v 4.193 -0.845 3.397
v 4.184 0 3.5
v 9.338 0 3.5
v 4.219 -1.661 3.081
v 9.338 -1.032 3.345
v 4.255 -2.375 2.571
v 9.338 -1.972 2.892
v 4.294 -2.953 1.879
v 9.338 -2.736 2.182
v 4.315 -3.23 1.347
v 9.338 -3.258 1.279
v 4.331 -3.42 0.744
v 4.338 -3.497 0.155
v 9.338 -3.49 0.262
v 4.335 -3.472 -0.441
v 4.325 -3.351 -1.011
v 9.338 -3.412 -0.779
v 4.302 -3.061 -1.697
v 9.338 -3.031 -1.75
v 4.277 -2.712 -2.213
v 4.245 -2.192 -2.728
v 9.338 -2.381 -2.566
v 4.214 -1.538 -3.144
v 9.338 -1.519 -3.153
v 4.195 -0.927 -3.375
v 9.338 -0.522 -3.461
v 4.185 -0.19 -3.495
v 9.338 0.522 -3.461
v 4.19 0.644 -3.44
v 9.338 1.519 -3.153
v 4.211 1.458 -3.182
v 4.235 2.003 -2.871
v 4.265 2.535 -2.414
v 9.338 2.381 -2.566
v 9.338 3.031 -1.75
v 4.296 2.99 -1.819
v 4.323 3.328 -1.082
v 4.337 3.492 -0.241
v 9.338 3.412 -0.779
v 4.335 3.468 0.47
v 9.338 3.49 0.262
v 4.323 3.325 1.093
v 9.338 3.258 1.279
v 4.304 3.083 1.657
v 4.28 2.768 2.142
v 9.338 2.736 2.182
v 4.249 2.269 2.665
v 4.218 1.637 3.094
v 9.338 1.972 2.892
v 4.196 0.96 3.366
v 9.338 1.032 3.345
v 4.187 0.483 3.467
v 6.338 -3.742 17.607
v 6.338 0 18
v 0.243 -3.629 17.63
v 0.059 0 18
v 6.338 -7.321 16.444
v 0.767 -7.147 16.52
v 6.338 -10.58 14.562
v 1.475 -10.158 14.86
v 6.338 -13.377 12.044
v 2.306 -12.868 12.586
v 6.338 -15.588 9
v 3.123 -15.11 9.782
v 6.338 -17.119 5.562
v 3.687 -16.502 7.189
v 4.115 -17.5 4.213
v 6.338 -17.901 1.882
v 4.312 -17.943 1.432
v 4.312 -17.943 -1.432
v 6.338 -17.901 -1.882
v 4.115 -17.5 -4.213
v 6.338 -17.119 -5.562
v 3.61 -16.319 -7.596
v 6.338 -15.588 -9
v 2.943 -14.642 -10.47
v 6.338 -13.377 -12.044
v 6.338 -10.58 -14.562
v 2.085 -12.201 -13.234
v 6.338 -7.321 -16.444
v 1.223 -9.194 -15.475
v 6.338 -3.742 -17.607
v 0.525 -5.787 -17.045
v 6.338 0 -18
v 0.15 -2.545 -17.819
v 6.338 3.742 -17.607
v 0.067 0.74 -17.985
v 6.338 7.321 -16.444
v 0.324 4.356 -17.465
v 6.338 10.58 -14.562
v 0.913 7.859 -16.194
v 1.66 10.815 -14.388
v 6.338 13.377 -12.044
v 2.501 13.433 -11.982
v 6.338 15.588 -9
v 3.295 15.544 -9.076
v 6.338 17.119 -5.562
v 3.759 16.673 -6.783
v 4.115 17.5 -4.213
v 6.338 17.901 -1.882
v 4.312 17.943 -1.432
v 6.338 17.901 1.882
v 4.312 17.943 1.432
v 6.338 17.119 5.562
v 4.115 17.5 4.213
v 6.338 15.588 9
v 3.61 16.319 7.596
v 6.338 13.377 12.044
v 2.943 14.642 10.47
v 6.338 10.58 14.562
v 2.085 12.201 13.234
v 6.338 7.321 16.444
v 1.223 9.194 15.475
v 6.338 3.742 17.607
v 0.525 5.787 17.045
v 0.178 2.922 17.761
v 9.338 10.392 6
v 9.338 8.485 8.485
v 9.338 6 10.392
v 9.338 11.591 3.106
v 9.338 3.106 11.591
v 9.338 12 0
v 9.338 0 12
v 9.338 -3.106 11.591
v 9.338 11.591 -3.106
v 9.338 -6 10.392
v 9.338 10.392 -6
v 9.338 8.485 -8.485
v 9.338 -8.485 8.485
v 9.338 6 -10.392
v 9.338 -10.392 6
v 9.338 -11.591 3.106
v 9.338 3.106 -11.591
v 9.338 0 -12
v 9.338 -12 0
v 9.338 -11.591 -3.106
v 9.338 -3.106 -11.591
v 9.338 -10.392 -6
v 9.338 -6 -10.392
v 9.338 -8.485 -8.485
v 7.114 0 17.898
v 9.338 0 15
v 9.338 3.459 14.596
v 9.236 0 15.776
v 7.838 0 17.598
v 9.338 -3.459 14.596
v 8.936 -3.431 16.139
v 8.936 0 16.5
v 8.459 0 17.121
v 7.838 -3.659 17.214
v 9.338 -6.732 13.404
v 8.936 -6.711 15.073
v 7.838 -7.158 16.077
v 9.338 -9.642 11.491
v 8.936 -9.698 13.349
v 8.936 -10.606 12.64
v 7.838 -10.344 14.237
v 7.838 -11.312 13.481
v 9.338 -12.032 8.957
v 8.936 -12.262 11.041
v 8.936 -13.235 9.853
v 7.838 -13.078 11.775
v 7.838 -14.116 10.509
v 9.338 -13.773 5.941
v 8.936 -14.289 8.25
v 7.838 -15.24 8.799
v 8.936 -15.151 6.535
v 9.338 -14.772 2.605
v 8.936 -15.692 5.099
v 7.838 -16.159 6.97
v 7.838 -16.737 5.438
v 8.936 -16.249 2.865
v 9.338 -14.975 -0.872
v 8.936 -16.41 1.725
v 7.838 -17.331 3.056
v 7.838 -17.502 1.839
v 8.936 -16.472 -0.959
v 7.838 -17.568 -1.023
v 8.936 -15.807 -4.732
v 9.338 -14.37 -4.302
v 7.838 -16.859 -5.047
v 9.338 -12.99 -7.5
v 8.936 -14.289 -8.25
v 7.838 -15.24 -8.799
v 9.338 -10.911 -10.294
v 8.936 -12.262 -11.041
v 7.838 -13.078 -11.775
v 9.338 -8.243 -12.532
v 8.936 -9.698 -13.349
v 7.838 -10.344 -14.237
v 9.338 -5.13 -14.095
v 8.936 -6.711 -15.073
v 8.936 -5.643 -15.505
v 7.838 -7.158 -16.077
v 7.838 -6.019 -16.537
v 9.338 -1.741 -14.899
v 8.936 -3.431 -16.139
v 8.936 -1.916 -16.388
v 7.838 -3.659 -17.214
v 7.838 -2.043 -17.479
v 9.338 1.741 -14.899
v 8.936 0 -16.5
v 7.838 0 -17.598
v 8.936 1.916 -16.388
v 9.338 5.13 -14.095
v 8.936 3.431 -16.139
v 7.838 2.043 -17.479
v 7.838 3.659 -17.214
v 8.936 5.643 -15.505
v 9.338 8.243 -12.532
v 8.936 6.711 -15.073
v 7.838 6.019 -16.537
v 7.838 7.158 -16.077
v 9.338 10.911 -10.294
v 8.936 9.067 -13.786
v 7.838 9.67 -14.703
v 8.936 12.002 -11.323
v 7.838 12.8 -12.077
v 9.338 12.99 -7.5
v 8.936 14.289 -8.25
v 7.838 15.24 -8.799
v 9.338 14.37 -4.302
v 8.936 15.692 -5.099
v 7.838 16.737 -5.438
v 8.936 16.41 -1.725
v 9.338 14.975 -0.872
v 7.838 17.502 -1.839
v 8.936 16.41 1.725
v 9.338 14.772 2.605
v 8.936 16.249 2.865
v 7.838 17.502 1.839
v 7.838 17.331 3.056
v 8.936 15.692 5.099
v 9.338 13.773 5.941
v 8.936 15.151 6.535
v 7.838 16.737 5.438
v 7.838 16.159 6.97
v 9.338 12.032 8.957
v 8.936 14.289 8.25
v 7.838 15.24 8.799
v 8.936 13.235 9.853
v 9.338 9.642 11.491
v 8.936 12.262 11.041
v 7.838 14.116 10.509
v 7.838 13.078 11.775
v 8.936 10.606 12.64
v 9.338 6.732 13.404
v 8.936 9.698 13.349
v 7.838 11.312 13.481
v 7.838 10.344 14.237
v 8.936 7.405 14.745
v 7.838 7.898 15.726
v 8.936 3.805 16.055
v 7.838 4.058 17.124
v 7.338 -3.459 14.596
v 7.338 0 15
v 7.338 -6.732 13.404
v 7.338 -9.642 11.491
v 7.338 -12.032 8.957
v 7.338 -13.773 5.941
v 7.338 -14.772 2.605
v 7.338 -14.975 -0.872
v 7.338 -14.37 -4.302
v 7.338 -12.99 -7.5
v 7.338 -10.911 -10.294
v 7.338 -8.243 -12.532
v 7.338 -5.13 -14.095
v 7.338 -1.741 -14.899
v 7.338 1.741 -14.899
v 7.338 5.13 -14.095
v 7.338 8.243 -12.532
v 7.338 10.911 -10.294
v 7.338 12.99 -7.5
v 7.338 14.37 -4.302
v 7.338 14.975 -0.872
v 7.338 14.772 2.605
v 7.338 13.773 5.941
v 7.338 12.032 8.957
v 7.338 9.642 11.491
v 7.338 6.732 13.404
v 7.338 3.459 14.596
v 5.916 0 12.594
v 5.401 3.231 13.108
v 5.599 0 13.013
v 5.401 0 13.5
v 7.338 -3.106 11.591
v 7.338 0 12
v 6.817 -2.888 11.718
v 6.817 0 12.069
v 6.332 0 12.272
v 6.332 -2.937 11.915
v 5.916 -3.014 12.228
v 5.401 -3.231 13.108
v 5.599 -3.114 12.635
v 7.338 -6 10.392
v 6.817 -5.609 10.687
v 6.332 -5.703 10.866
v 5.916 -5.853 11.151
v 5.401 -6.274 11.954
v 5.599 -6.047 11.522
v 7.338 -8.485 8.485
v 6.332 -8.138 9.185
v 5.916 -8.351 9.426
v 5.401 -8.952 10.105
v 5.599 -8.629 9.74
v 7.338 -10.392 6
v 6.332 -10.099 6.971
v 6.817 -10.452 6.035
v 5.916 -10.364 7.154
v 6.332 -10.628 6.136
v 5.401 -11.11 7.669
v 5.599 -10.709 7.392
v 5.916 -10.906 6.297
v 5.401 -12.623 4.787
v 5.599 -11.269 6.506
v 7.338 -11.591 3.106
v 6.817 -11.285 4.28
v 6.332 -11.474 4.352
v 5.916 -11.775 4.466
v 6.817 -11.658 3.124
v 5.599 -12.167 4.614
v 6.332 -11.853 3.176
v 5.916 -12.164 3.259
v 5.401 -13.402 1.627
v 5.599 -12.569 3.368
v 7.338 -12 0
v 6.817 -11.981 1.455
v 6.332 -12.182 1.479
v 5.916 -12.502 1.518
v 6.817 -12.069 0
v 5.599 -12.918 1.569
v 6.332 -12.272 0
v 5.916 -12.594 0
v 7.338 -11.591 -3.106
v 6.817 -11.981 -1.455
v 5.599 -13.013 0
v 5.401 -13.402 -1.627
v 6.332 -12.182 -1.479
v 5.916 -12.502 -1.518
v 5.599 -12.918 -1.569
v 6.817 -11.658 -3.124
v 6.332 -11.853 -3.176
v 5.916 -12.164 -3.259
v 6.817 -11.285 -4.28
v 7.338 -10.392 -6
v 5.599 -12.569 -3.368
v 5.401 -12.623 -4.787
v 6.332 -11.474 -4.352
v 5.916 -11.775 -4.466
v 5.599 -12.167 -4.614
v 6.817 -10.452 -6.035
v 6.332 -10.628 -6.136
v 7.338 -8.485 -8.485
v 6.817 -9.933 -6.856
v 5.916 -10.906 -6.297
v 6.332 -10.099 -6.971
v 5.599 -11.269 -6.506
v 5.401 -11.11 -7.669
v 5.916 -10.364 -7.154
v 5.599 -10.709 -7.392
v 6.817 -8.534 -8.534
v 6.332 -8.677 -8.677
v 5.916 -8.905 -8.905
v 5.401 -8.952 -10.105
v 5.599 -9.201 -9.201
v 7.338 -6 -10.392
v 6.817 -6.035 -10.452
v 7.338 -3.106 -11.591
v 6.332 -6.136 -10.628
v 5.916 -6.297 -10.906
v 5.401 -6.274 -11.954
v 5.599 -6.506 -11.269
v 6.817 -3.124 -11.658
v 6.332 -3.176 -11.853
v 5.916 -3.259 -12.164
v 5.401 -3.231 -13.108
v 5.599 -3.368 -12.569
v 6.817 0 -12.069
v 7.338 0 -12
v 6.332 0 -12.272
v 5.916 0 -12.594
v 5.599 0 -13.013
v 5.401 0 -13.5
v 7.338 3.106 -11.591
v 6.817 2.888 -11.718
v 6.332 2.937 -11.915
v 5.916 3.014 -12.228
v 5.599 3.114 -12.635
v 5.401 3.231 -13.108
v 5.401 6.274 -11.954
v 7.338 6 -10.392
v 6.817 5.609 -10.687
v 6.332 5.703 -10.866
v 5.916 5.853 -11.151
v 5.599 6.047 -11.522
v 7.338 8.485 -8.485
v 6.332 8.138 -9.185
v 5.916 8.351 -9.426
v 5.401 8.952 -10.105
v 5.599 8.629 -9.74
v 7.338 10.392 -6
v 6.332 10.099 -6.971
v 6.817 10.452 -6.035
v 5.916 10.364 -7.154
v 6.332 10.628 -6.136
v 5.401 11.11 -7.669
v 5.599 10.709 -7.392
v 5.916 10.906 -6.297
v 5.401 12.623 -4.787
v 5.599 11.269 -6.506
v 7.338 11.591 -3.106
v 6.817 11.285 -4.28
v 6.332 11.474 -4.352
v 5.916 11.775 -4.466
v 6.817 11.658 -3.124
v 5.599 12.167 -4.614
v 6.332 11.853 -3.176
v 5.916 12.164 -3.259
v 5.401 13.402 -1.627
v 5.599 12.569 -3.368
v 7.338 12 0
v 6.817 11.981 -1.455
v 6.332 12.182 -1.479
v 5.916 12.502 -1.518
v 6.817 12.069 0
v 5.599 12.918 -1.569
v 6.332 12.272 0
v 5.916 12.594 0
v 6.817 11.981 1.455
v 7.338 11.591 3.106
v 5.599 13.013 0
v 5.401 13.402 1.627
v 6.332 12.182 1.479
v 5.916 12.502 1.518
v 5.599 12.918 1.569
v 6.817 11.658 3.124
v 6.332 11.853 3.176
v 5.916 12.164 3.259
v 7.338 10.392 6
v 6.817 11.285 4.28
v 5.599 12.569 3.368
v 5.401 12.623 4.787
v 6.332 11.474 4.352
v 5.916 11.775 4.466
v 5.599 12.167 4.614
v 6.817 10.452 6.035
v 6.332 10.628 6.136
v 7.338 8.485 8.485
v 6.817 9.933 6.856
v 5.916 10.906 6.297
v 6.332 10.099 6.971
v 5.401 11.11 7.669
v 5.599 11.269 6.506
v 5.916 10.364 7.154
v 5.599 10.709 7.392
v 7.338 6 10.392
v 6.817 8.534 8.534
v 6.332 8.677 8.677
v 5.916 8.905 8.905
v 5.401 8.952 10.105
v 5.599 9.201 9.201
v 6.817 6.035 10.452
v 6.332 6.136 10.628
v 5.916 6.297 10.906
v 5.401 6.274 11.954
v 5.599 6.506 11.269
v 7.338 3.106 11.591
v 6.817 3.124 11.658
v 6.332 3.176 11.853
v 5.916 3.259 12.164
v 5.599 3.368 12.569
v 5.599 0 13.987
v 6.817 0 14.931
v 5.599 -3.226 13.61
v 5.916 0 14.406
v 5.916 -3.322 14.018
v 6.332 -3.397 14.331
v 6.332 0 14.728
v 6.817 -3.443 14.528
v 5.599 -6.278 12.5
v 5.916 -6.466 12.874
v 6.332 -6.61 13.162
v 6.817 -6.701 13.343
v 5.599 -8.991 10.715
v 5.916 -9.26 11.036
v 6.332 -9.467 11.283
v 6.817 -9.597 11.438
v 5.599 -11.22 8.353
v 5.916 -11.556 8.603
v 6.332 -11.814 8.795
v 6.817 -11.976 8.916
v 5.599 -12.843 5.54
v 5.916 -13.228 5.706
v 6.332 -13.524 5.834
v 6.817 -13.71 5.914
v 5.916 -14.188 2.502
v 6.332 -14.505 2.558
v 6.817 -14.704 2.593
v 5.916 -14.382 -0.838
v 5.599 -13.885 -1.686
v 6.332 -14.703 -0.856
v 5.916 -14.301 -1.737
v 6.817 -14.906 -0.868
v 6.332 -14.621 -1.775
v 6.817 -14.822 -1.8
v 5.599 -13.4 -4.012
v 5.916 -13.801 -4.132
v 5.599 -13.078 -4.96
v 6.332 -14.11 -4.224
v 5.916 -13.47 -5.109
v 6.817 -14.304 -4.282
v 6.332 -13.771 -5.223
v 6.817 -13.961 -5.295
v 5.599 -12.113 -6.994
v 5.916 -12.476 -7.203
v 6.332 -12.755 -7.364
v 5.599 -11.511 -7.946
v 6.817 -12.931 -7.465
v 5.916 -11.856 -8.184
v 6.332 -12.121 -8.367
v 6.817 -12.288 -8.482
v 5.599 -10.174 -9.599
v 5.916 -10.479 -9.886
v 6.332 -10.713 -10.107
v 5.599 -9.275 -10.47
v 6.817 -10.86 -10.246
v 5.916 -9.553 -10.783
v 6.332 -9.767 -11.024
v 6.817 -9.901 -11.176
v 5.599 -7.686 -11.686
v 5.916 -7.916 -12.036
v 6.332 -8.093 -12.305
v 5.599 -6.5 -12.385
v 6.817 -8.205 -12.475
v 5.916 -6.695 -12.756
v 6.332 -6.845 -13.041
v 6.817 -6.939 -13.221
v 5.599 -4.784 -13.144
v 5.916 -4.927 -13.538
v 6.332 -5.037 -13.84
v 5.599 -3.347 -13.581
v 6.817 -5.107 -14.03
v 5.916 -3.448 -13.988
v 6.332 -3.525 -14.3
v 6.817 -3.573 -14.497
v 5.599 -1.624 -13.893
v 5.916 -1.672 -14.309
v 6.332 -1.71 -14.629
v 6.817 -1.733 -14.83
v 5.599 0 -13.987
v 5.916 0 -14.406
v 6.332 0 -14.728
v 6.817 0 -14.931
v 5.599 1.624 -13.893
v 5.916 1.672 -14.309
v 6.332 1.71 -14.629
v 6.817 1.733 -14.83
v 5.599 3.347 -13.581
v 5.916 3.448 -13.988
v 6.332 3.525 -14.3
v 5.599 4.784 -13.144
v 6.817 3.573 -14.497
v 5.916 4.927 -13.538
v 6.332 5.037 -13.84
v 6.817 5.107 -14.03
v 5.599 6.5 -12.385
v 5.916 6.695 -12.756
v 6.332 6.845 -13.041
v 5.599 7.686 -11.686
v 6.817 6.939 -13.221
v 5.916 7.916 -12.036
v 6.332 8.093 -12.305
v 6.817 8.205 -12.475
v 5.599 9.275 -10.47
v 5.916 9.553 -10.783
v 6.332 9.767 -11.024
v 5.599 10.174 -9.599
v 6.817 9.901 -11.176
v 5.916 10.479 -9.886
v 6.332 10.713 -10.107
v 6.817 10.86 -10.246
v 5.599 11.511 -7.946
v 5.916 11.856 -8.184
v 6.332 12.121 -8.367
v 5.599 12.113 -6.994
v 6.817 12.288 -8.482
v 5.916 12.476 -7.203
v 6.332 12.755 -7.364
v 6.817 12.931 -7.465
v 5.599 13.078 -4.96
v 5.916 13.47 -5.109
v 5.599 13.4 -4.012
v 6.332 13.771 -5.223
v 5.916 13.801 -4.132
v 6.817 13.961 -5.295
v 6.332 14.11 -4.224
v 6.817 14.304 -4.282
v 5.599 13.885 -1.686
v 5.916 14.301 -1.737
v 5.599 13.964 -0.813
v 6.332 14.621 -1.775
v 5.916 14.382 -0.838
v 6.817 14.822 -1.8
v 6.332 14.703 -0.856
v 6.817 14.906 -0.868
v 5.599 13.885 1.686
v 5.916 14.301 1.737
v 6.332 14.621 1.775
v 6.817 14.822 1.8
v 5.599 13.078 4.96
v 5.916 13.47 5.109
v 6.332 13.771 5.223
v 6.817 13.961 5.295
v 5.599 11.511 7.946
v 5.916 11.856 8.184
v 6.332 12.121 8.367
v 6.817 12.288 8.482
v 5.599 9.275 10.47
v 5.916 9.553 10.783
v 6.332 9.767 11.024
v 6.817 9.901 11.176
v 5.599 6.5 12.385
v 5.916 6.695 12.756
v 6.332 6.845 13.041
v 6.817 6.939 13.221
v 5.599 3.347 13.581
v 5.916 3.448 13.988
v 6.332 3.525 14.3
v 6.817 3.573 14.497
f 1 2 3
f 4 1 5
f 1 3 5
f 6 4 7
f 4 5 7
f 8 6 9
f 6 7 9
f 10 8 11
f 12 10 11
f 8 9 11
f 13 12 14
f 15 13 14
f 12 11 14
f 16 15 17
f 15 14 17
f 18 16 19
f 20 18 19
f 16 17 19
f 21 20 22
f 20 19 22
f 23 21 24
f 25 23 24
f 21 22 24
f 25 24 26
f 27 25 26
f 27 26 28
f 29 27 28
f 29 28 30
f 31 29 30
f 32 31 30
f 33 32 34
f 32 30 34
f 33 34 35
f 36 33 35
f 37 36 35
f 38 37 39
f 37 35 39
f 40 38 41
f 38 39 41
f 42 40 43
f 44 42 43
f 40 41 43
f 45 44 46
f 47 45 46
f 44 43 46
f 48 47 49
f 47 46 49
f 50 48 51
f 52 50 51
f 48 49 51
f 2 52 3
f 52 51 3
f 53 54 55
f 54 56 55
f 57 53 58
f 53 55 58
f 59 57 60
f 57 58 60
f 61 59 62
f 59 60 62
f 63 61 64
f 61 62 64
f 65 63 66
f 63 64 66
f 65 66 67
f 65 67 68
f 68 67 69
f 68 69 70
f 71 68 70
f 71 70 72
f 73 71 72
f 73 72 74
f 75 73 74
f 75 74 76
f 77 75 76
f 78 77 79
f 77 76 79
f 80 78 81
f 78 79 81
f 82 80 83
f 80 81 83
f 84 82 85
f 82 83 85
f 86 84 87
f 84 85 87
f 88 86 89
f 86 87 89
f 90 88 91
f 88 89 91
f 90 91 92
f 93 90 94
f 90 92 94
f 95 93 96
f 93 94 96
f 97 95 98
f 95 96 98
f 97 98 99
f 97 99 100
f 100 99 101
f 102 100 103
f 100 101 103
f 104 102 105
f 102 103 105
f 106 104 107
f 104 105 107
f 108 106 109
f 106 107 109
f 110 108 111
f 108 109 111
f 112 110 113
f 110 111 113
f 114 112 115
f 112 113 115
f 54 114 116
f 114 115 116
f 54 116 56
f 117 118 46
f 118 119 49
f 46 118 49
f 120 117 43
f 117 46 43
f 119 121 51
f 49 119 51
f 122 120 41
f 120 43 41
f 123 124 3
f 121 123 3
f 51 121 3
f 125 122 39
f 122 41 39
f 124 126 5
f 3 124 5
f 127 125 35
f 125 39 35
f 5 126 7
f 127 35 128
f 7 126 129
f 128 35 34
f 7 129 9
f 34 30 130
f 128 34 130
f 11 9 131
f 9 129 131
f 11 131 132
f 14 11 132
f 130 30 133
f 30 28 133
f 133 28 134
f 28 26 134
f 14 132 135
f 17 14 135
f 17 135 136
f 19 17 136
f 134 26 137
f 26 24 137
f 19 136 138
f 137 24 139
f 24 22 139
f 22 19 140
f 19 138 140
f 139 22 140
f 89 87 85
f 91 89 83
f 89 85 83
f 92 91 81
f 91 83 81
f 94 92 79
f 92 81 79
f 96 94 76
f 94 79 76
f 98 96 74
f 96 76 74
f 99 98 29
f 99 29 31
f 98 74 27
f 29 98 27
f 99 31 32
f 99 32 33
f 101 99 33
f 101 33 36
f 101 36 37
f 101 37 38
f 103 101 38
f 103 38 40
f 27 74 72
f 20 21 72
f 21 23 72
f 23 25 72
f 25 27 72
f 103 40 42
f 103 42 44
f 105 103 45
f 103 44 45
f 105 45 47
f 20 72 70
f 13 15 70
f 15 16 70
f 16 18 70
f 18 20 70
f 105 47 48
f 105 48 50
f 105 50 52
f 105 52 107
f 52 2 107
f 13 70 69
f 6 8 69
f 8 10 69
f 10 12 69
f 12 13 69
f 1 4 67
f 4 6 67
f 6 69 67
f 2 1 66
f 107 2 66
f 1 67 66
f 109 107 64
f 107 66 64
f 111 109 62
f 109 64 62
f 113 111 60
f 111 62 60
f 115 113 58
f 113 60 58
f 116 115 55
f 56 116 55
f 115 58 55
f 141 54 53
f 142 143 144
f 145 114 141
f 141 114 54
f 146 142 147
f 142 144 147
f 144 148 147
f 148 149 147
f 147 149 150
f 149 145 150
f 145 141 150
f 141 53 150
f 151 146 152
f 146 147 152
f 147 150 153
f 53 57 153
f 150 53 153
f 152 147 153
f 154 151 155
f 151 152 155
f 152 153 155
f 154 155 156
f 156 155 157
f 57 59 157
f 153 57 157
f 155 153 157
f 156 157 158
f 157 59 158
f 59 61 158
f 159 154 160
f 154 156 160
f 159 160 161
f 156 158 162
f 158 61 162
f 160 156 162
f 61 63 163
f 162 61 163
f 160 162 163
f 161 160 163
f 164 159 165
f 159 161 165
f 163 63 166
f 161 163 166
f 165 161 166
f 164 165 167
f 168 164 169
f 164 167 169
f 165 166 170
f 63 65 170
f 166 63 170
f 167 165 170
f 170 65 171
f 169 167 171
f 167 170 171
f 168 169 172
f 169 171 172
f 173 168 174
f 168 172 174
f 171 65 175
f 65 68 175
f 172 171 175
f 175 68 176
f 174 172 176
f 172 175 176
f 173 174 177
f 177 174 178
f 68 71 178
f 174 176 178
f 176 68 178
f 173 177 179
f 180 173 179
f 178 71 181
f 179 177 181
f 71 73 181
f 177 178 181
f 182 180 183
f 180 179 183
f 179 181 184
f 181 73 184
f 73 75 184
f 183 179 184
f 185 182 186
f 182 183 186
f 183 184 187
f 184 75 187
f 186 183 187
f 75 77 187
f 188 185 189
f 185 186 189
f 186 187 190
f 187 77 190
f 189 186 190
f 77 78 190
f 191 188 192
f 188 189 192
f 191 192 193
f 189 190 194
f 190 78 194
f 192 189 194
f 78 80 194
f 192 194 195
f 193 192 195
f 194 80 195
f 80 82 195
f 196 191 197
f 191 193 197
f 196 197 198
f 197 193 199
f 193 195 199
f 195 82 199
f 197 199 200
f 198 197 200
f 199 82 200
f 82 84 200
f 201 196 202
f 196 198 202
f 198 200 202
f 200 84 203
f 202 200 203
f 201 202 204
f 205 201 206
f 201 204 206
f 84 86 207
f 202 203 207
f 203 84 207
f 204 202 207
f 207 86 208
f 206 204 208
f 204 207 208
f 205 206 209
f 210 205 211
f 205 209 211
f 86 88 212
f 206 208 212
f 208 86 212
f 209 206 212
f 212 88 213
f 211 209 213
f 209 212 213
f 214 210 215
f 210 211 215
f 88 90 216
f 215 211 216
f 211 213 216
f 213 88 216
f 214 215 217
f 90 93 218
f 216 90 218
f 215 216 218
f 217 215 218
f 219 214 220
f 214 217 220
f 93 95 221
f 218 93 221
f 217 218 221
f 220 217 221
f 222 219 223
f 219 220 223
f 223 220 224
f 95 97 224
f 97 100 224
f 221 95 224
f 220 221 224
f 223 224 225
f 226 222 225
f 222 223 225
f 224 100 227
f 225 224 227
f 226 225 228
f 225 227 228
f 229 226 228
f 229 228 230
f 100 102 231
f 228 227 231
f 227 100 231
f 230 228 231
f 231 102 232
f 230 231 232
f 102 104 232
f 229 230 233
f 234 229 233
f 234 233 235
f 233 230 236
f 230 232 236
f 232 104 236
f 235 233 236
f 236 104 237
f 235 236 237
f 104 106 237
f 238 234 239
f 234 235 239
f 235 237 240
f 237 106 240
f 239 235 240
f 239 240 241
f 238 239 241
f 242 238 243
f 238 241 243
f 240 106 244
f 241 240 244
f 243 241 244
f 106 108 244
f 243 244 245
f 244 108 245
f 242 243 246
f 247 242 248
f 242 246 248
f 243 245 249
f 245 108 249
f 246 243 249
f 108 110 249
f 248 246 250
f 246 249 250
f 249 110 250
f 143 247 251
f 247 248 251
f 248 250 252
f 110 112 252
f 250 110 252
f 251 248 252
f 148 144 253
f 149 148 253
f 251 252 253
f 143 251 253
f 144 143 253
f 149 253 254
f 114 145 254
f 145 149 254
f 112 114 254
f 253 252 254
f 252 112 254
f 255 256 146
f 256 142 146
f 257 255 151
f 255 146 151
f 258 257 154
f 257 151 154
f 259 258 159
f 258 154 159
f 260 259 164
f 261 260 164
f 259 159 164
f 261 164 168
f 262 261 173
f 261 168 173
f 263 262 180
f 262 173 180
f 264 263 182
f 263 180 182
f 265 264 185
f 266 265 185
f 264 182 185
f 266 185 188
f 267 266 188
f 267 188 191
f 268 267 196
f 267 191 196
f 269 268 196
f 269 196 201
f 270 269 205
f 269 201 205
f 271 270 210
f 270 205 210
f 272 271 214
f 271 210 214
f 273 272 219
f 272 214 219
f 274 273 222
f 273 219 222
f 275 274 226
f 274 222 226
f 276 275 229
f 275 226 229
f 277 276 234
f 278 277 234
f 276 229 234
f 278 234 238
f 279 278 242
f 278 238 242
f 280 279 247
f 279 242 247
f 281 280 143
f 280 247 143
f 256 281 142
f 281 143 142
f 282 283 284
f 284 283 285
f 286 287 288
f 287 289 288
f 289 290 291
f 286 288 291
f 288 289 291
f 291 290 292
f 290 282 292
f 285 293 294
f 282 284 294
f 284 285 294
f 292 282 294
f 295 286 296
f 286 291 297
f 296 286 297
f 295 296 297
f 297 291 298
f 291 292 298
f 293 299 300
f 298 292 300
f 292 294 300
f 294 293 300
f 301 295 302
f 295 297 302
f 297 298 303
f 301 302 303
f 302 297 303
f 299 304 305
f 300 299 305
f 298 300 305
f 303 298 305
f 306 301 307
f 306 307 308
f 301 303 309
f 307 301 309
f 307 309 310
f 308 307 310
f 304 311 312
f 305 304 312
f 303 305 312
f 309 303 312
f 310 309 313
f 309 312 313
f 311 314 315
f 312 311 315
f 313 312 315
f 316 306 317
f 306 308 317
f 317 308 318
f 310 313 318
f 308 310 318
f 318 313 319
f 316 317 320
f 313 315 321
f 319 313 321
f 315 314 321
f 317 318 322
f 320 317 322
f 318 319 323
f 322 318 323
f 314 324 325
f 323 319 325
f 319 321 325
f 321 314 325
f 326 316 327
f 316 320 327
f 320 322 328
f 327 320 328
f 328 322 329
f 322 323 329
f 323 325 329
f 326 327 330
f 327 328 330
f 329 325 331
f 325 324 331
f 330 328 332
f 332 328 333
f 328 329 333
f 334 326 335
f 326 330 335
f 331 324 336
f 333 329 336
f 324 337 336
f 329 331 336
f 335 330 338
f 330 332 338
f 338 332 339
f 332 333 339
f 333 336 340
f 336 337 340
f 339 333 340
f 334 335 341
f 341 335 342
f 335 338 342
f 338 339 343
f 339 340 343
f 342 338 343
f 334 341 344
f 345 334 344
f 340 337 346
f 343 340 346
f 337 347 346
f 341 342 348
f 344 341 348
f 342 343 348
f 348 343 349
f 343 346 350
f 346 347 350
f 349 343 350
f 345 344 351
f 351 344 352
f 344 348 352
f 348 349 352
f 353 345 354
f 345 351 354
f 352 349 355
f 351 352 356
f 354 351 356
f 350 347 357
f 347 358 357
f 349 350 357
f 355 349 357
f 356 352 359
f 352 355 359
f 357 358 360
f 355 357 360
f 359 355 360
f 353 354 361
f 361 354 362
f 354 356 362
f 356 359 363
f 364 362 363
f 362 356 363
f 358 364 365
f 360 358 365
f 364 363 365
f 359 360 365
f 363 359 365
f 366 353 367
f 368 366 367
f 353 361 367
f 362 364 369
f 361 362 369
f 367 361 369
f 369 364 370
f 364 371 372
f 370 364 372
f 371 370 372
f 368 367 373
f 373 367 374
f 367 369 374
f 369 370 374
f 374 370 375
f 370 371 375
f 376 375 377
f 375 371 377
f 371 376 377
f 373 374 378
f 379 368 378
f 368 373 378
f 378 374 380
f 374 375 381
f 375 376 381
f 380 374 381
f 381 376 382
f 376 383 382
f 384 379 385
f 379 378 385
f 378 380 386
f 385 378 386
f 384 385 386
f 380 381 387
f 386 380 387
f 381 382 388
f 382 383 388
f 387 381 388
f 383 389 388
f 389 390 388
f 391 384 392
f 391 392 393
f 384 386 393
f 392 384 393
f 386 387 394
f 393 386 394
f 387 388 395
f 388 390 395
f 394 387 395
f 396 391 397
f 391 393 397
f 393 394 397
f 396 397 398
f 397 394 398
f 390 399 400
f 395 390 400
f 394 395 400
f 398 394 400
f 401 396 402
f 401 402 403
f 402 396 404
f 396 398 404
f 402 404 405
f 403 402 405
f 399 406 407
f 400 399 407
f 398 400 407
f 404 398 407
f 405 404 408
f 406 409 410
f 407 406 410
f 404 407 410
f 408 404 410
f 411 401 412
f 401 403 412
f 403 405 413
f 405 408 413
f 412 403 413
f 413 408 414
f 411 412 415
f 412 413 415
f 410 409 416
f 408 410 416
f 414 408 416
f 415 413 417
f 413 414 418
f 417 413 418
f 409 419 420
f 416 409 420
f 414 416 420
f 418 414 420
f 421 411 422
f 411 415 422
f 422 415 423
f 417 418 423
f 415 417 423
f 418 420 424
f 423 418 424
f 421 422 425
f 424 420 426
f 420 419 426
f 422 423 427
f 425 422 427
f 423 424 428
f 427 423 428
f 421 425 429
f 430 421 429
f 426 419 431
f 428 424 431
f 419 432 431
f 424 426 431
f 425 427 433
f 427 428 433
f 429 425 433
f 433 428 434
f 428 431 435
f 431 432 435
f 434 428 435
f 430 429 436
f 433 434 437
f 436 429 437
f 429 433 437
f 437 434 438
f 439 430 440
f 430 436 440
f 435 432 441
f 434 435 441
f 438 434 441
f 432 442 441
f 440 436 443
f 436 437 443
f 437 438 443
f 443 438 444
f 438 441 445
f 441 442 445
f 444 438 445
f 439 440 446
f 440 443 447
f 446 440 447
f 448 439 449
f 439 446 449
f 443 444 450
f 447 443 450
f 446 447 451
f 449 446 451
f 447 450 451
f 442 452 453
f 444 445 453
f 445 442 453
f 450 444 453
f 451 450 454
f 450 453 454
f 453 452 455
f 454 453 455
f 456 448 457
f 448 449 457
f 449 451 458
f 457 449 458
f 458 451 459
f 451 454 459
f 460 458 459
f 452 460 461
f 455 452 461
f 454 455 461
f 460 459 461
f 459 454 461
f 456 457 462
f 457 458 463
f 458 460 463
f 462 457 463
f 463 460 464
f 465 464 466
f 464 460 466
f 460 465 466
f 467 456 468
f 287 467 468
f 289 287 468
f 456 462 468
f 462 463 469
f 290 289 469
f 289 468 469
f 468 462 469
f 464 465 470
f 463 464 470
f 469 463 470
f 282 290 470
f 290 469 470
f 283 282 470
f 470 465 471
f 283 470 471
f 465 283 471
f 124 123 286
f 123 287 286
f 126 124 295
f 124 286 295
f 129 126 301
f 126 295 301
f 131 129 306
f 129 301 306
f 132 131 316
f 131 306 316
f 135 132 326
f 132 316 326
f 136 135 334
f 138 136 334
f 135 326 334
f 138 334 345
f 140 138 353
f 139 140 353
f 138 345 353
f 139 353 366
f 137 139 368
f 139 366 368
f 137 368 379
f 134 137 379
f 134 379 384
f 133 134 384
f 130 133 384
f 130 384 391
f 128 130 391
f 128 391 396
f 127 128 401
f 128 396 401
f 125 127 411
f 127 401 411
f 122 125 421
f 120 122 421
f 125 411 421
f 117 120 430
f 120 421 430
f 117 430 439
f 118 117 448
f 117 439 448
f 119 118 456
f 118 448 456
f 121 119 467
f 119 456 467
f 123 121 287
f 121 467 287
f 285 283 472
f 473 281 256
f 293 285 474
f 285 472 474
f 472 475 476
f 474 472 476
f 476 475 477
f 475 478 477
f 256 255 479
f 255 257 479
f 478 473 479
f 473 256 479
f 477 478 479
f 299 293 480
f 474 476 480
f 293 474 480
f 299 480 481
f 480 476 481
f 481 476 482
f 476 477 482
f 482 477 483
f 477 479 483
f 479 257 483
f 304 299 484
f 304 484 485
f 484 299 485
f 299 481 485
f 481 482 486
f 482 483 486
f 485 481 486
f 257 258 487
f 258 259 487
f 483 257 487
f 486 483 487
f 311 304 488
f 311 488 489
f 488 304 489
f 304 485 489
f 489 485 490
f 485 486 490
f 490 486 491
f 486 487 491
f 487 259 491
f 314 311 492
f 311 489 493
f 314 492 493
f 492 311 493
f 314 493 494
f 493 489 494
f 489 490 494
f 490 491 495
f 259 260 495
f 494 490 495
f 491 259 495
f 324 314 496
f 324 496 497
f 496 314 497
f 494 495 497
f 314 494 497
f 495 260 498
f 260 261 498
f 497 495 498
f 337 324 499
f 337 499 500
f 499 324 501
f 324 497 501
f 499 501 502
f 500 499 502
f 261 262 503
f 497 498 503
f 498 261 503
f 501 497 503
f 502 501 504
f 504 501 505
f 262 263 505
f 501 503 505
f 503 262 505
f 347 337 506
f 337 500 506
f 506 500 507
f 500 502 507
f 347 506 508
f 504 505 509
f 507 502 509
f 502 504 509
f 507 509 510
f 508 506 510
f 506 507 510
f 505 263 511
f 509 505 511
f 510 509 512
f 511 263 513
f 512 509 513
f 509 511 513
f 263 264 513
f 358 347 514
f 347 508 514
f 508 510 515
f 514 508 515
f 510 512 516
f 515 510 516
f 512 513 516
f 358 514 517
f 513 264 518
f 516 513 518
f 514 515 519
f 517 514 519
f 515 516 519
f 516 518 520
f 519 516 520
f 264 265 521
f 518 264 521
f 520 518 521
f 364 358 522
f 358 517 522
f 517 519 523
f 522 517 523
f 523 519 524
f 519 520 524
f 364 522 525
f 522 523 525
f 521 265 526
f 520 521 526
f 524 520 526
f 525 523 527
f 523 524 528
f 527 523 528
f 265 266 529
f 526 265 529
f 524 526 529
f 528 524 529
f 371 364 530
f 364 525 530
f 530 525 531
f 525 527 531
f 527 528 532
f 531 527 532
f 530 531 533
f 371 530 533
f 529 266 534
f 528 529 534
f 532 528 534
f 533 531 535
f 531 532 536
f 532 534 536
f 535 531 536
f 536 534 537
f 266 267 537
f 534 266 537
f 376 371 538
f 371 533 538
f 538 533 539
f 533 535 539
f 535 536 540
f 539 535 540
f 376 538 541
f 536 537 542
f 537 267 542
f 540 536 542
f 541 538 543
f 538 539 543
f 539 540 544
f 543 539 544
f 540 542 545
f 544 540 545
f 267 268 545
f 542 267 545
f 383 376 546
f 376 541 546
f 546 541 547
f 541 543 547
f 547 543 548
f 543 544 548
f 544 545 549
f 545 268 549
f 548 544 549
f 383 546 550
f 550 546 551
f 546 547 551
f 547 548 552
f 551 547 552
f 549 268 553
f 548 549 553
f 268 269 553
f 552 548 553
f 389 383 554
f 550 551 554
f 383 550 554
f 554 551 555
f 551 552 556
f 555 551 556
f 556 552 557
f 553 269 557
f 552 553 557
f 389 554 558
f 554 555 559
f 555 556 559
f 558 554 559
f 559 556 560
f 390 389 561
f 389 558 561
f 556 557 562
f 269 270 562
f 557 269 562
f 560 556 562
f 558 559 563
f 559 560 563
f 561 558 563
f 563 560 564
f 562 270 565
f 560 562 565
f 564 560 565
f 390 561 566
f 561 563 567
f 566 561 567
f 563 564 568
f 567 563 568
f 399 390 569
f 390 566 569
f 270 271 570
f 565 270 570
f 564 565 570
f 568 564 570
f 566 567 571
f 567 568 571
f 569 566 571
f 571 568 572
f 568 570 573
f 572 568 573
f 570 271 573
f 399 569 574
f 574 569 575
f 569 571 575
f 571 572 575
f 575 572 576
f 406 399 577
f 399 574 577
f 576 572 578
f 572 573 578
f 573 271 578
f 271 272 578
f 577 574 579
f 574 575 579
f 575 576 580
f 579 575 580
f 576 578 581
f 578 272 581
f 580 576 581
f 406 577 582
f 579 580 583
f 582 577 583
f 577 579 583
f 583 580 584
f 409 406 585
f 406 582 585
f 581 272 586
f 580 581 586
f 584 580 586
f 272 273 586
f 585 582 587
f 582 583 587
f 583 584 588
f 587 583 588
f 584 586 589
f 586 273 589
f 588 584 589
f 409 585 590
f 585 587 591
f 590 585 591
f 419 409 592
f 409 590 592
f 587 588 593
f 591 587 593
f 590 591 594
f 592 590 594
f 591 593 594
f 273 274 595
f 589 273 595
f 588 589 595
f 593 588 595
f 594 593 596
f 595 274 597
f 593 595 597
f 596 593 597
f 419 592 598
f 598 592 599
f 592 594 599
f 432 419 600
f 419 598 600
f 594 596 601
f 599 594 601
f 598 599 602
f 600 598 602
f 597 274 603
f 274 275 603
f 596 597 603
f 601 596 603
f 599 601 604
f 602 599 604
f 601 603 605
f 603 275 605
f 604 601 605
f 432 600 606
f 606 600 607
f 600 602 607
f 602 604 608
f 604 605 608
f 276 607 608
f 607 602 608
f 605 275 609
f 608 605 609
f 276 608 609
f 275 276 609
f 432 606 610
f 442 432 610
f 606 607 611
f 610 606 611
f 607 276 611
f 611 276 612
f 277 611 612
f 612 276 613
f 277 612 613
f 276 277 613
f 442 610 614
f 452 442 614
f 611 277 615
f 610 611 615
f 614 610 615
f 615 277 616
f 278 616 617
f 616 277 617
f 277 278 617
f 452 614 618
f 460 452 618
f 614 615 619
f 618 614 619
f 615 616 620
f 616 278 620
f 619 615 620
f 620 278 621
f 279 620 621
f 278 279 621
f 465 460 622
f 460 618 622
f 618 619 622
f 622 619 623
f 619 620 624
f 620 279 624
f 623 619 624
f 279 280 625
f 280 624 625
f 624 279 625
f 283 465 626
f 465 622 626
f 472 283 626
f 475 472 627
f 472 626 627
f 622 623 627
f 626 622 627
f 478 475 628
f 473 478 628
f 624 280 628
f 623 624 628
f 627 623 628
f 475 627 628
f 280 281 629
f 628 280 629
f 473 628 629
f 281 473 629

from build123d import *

# Parameters (mm, degrees)
F2_R      = 40
F3_DEPTH  = 17.5
F4_DEPTH  = 33
F4_FACE_R = 40
F5_DEPTH  = 80


with BuildPart() as f1:
    # F0 (on Front) → F1 (revolve)
    with BuildSketch(Plane.XZ):
        with BuildLine():
            Line((6.337865, 18), (-29.596411, 18))
            Line((-29.596411, 18), (-29.596411, 3.5))
            Line((-29.596411, 3.5), (-15.774649, 3.5))
            Line((-15.774649, 3.5), (9.337865, 3.5))
            Line((9.337865, 3.5), (9.337865, 12))
            Line((9.337865, 12), (7.337865, 12))
            ThreePointArc((7.337865, 12), (6.11312, 12.418861), (5.401373, 13.5))
            ThreePointArc((5.401373, 13.5), (6.11312, 14.581139), (7.337865, 15))
            Line((7.337865, 15), (9.337865, 15))
            ThreePointArc((9.337865, 15), (8.459185, 17.12132), (6.337865, 18))
        make_face()
        with BuildLine():
            ThreePointArc((5.337865, 14), (5.353806, 13.747991), (5.401373, 13.5))
            ThreePointArc((5.401373, 13.5), (5.353806, 13.252009), (5.337865, 13))
            Line((5.337865, 13), (5.337865, 14))
        make_face(mode=Mode.SUBTRACT)
        with BuildLine():
            ThreePointArc((5.337865, 13), (5.353806, 13.252009), (5.401373, 13.5))
            ThreePointArc((5.401373, 13.5), (5.353806, 13.747991), (5.337865, 14))
            Line((5.337865, 14), (5.337865, 13))
        make_face()
    revolve(axis=Axis((-3.107623, 0, 0), (1, 0, 0)))

    # F2 (on Front) → F3 (cut, symmetric)
    with BuildSketch(Plane.XZ):
        with Locations((-35.662135, 0)):
            Circle(F2_R)
    extrude(amount=F3_DEPTH, both=True, mode=Mode.SUBTRACT)

    # F2 (on Front) → F4 (join, symmetric)
    with BuildSketch(Plane.XZ):
        with Locations((-35.662135, 0)):
            Circle(F2_R)
    extrude(amount=F4_DEPTH, both=True)

    # F4_face (on face) → F5 (cut)
    with BuildSketch(Plane(origin=(-35.662135, -33, 0), x_dir=(1, 0, 0), z_dir=(0, -1, 0))):
        Circle(F4_FACE_R)
    extrude(amount=-F5_DEPTH, mode=Mode.SUBTRACT)


solid = f1.part
